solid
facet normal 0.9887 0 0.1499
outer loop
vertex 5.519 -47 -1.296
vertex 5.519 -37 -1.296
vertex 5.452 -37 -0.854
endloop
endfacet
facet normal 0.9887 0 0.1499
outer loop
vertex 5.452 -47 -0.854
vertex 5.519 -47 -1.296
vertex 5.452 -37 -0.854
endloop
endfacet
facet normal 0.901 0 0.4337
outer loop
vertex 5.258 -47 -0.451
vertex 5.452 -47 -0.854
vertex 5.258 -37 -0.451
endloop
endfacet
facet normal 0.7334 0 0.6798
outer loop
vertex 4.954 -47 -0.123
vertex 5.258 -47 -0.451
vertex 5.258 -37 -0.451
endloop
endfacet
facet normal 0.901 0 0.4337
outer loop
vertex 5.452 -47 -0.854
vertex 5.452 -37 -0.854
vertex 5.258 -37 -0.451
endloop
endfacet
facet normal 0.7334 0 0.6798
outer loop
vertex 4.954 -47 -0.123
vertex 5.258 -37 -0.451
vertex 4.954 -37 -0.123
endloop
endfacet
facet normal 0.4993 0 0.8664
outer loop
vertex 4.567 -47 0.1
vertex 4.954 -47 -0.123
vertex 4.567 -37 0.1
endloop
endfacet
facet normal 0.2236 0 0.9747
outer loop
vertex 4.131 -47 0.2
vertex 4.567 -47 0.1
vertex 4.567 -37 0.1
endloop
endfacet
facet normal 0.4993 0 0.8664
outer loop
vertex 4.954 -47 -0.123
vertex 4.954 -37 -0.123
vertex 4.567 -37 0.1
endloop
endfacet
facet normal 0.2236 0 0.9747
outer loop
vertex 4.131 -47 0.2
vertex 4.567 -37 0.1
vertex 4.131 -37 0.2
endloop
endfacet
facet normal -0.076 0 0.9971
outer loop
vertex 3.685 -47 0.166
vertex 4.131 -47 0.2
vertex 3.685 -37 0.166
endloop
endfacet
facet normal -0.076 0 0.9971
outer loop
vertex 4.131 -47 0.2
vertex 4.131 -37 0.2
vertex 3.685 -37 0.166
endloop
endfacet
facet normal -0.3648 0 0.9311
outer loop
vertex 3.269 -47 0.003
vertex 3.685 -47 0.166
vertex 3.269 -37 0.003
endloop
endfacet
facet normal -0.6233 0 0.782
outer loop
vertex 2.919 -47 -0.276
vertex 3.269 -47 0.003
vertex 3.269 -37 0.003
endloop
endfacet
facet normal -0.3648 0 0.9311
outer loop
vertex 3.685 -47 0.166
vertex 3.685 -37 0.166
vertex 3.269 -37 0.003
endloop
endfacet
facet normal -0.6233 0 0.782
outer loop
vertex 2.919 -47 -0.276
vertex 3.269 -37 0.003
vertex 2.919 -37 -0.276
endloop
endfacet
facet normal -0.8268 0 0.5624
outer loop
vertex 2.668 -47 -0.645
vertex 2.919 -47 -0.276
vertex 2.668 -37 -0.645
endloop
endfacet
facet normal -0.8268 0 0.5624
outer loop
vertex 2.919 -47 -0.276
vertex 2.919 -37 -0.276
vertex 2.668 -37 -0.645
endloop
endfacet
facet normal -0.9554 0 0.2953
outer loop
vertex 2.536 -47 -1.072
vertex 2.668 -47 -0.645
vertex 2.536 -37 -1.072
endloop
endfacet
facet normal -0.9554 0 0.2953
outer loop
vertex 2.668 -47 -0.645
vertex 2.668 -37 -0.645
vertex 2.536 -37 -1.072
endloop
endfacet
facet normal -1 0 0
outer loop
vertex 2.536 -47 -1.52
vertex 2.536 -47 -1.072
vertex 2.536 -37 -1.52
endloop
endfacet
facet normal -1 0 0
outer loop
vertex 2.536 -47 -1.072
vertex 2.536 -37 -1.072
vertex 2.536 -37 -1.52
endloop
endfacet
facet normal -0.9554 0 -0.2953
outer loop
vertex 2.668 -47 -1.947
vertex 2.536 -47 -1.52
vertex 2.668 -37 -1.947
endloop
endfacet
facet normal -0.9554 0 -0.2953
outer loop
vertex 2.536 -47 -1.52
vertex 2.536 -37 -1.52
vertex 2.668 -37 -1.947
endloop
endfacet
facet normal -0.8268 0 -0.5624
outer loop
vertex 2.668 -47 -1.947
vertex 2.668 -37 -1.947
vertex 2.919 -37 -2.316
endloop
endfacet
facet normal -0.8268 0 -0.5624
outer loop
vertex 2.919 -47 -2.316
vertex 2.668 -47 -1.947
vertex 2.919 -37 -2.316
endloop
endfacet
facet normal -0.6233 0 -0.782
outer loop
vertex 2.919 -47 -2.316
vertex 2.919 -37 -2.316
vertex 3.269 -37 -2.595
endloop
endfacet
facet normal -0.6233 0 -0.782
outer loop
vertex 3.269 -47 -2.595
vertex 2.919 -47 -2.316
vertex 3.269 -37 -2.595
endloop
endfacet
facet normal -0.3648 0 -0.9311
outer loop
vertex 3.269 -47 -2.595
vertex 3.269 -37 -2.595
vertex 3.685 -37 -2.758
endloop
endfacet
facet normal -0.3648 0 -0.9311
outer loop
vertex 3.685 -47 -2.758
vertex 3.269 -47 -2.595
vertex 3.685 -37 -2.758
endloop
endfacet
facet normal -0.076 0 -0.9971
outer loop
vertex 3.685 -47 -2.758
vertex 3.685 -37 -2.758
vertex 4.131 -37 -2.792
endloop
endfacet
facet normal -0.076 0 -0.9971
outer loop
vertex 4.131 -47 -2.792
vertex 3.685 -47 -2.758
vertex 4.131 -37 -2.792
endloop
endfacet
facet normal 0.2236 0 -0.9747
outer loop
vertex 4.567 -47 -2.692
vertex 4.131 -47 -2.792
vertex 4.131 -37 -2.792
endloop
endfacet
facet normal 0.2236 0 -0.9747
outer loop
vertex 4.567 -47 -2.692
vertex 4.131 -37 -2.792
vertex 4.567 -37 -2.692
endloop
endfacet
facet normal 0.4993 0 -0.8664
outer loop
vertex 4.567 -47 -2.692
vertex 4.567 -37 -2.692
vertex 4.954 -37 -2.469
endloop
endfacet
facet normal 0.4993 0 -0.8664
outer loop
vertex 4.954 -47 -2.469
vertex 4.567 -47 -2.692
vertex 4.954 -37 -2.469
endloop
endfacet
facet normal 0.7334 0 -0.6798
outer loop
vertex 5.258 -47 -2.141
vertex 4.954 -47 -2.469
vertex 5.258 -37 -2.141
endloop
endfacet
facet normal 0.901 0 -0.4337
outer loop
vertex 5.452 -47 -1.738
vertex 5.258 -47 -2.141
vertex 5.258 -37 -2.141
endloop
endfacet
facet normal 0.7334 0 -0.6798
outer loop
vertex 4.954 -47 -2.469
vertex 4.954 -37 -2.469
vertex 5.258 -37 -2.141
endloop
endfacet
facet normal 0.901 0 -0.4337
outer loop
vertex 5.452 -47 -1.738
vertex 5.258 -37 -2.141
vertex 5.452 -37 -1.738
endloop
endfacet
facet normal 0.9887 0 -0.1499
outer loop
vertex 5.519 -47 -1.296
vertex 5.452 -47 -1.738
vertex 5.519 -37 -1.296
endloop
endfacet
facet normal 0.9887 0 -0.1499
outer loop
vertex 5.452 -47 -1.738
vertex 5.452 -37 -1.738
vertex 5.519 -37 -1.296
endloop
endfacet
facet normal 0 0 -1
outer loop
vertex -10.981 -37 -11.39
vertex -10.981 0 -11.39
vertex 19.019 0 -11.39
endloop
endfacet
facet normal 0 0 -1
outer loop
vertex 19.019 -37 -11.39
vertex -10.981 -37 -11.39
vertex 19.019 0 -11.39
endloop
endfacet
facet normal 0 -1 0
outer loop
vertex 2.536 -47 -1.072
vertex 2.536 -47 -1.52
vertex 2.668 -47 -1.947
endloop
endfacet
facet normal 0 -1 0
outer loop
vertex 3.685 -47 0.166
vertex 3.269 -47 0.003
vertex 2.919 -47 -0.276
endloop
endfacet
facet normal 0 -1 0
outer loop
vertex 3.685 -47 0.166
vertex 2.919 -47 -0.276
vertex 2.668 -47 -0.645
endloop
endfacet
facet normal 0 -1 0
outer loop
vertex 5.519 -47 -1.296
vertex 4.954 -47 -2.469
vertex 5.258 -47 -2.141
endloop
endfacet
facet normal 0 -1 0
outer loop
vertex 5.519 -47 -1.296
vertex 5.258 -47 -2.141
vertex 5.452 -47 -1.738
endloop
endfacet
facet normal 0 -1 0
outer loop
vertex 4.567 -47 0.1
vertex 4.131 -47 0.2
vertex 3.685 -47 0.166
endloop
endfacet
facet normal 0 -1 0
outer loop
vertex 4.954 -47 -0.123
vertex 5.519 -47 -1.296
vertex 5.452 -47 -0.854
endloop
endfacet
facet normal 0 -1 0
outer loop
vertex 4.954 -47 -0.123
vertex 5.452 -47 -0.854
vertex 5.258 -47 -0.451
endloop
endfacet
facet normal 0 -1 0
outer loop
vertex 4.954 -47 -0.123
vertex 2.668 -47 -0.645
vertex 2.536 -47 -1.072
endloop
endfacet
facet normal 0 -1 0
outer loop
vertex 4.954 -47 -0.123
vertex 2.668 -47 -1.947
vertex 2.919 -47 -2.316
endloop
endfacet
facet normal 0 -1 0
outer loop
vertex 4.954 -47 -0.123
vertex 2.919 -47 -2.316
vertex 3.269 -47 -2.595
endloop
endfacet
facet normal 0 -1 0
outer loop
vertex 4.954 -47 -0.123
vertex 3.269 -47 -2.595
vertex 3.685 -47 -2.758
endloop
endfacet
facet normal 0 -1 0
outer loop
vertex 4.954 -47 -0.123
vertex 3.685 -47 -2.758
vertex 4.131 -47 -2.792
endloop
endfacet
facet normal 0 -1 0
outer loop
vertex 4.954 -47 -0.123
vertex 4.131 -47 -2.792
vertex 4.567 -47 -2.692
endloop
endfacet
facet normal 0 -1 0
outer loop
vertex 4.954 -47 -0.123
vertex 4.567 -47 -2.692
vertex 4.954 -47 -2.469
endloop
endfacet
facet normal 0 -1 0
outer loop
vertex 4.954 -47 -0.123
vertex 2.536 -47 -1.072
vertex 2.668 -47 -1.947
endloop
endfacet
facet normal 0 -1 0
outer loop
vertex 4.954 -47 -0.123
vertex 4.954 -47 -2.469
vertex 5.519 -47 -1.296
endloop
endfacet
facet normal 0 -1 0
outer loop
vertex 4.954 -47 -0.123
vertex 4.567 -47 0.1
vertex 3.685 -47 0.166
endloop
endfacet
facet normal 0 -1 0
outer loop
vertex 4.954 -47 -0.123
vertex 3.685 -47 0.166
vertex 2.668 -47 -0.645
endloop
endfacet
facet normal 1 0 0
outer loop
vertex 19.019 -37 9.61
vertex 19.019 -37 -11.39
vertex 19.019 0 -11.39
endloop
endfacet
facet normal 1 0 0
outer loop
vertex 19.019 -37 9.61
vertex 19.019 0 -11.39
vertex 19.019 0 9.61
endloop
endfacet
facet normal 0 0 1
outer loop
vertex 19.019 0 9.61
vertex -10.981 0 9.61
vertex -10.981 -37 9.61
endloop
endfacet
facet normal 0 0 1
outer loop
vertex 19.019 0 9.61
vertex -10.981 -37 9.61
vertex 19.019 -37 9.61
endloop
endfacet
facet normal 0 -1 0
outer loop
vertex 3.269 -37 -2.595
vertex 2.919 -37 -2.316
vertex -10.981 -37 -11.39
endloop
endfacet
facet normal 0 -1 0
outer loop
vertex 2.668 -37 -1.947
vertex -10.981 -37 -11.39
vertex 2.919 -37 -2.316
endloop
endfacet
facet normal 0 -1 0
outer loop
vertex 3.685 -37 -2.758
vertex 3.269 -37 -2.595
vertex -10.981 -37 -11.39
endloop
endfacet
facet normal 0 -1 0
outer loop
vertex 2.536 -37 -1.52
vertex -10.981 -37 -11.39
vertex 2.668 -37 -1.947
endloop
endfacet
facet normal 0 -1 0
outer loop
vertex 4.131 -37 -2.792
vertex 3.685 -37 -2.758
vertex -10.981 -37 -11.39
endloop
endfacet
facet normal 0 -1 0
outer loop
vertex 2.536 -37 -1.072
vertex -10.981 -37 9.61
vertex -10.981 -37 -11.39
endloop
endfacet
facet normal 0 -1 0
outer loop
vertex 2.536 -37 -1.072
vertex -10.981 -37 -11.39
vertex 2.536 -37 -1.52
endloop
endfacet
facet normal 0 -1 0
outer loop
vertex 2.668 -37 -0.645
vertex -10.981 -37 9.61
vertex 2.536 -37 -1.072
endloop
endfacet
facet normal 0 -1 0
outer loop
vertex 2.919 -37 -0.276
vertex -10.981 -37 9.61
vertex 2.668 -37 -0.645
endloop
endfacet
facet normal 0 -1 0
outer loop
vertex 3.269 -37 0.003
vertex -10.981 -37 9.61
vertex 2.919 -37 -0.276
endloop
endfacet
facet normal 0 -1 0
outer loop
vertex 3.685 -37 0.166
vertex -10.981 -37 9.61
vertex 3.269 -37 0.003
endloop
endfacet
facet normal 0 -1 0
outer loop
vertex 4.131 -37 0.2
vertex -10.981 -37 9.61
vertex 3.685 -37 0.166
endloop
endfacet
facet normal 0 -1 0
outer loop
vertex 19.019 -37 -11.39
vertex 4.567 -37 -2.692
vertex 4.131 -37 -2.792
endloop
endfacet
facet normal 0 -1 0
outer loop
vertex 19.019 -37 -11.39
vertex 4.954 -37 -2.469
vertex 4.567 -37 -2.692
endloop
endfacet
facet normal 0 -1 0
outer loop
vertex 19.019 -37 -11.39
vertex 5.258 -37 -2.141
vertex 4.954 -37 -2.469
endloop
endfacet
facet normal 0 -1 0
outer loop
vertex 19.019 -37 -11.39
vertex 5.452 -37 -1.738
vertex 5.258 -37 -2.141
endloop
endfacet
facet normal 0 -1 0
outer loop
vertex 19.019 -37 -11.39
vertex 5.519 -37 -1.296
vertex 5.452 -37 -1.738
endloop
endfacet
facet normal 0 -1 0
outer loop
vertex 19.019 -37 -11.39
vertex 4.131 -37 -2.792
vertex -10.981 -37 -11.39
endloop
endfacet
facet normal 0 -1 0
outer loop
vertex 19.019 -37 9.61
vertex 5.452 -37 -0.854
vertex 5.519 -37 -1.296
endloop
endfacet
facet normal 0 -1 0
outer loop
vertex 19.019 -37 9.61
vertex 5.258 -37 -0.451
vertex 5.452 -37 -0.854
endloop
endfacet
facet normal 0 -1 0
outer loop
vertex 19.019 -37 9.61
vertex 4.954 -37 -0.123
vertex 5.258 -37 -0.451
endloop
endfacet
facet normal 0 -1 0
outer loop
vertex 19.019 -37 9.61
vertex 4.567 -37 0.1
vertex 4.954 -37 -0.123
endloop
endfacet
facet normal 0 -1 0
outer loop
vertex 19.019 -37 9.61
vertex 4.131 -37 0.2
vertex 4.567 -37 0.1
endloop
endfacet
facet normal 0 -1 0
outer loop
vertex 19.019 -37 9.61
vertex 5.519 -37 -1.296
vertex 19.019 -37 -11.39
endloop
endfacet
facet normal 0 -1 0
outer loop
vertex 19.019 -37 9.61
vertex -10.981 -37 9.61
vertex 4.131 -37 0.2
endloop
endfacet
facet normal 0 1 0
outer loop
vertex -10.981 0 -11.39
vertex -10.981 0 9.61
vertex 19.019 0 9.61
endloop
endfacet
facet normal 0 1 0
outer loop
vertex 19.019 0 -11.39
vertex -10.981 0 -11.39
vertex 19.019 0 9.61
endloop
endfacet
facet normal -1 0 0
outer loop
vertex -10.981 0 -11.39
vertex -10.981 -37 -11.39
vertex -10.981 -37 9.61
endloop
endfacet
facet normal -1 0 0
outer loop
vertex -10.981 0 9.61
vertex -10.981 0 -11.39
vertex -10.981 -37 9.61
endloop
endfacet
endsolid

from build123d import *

# Parameters (mm, degrees)
F0_W     = 30
F0_H     = 21
F1_DEPTH = 37
F2_W     = 5
F2_H     = 5
F3_DEPTH = 37
F4_R     = 1.5
F5_DEPTH = 10


with BuildPart() as f1:
    # F0 (on Front) → F1 (new body)
    with BuildSketch(Plane.XZ):
        with Locations((4.018988, -0.890413)):
            Rectangle(F0_W, F0_H)
    extrude(amount=F1_DEPTH)

    # F2 (on face) → F3 (join)
    with BuildSketch(Plane(origin=(0, 0, 0), x_dir=(-1, 0, 0), z_dir=(0, 1, 0))):
        with Locations((-16.518988, -8.890413)):
            Rectangle(F2_W, F2_H)
    extrude(amount=-F3_DEPTH)

    # F4 (on face) → F5 (join)
    with BuildSketch(Plane.XZ.offset(37)):
        with Locations((4.018988, -1.295996)):
            Circle(F4_R)
    extrude(amount=F5_DEPTH)


solid = f1.part
